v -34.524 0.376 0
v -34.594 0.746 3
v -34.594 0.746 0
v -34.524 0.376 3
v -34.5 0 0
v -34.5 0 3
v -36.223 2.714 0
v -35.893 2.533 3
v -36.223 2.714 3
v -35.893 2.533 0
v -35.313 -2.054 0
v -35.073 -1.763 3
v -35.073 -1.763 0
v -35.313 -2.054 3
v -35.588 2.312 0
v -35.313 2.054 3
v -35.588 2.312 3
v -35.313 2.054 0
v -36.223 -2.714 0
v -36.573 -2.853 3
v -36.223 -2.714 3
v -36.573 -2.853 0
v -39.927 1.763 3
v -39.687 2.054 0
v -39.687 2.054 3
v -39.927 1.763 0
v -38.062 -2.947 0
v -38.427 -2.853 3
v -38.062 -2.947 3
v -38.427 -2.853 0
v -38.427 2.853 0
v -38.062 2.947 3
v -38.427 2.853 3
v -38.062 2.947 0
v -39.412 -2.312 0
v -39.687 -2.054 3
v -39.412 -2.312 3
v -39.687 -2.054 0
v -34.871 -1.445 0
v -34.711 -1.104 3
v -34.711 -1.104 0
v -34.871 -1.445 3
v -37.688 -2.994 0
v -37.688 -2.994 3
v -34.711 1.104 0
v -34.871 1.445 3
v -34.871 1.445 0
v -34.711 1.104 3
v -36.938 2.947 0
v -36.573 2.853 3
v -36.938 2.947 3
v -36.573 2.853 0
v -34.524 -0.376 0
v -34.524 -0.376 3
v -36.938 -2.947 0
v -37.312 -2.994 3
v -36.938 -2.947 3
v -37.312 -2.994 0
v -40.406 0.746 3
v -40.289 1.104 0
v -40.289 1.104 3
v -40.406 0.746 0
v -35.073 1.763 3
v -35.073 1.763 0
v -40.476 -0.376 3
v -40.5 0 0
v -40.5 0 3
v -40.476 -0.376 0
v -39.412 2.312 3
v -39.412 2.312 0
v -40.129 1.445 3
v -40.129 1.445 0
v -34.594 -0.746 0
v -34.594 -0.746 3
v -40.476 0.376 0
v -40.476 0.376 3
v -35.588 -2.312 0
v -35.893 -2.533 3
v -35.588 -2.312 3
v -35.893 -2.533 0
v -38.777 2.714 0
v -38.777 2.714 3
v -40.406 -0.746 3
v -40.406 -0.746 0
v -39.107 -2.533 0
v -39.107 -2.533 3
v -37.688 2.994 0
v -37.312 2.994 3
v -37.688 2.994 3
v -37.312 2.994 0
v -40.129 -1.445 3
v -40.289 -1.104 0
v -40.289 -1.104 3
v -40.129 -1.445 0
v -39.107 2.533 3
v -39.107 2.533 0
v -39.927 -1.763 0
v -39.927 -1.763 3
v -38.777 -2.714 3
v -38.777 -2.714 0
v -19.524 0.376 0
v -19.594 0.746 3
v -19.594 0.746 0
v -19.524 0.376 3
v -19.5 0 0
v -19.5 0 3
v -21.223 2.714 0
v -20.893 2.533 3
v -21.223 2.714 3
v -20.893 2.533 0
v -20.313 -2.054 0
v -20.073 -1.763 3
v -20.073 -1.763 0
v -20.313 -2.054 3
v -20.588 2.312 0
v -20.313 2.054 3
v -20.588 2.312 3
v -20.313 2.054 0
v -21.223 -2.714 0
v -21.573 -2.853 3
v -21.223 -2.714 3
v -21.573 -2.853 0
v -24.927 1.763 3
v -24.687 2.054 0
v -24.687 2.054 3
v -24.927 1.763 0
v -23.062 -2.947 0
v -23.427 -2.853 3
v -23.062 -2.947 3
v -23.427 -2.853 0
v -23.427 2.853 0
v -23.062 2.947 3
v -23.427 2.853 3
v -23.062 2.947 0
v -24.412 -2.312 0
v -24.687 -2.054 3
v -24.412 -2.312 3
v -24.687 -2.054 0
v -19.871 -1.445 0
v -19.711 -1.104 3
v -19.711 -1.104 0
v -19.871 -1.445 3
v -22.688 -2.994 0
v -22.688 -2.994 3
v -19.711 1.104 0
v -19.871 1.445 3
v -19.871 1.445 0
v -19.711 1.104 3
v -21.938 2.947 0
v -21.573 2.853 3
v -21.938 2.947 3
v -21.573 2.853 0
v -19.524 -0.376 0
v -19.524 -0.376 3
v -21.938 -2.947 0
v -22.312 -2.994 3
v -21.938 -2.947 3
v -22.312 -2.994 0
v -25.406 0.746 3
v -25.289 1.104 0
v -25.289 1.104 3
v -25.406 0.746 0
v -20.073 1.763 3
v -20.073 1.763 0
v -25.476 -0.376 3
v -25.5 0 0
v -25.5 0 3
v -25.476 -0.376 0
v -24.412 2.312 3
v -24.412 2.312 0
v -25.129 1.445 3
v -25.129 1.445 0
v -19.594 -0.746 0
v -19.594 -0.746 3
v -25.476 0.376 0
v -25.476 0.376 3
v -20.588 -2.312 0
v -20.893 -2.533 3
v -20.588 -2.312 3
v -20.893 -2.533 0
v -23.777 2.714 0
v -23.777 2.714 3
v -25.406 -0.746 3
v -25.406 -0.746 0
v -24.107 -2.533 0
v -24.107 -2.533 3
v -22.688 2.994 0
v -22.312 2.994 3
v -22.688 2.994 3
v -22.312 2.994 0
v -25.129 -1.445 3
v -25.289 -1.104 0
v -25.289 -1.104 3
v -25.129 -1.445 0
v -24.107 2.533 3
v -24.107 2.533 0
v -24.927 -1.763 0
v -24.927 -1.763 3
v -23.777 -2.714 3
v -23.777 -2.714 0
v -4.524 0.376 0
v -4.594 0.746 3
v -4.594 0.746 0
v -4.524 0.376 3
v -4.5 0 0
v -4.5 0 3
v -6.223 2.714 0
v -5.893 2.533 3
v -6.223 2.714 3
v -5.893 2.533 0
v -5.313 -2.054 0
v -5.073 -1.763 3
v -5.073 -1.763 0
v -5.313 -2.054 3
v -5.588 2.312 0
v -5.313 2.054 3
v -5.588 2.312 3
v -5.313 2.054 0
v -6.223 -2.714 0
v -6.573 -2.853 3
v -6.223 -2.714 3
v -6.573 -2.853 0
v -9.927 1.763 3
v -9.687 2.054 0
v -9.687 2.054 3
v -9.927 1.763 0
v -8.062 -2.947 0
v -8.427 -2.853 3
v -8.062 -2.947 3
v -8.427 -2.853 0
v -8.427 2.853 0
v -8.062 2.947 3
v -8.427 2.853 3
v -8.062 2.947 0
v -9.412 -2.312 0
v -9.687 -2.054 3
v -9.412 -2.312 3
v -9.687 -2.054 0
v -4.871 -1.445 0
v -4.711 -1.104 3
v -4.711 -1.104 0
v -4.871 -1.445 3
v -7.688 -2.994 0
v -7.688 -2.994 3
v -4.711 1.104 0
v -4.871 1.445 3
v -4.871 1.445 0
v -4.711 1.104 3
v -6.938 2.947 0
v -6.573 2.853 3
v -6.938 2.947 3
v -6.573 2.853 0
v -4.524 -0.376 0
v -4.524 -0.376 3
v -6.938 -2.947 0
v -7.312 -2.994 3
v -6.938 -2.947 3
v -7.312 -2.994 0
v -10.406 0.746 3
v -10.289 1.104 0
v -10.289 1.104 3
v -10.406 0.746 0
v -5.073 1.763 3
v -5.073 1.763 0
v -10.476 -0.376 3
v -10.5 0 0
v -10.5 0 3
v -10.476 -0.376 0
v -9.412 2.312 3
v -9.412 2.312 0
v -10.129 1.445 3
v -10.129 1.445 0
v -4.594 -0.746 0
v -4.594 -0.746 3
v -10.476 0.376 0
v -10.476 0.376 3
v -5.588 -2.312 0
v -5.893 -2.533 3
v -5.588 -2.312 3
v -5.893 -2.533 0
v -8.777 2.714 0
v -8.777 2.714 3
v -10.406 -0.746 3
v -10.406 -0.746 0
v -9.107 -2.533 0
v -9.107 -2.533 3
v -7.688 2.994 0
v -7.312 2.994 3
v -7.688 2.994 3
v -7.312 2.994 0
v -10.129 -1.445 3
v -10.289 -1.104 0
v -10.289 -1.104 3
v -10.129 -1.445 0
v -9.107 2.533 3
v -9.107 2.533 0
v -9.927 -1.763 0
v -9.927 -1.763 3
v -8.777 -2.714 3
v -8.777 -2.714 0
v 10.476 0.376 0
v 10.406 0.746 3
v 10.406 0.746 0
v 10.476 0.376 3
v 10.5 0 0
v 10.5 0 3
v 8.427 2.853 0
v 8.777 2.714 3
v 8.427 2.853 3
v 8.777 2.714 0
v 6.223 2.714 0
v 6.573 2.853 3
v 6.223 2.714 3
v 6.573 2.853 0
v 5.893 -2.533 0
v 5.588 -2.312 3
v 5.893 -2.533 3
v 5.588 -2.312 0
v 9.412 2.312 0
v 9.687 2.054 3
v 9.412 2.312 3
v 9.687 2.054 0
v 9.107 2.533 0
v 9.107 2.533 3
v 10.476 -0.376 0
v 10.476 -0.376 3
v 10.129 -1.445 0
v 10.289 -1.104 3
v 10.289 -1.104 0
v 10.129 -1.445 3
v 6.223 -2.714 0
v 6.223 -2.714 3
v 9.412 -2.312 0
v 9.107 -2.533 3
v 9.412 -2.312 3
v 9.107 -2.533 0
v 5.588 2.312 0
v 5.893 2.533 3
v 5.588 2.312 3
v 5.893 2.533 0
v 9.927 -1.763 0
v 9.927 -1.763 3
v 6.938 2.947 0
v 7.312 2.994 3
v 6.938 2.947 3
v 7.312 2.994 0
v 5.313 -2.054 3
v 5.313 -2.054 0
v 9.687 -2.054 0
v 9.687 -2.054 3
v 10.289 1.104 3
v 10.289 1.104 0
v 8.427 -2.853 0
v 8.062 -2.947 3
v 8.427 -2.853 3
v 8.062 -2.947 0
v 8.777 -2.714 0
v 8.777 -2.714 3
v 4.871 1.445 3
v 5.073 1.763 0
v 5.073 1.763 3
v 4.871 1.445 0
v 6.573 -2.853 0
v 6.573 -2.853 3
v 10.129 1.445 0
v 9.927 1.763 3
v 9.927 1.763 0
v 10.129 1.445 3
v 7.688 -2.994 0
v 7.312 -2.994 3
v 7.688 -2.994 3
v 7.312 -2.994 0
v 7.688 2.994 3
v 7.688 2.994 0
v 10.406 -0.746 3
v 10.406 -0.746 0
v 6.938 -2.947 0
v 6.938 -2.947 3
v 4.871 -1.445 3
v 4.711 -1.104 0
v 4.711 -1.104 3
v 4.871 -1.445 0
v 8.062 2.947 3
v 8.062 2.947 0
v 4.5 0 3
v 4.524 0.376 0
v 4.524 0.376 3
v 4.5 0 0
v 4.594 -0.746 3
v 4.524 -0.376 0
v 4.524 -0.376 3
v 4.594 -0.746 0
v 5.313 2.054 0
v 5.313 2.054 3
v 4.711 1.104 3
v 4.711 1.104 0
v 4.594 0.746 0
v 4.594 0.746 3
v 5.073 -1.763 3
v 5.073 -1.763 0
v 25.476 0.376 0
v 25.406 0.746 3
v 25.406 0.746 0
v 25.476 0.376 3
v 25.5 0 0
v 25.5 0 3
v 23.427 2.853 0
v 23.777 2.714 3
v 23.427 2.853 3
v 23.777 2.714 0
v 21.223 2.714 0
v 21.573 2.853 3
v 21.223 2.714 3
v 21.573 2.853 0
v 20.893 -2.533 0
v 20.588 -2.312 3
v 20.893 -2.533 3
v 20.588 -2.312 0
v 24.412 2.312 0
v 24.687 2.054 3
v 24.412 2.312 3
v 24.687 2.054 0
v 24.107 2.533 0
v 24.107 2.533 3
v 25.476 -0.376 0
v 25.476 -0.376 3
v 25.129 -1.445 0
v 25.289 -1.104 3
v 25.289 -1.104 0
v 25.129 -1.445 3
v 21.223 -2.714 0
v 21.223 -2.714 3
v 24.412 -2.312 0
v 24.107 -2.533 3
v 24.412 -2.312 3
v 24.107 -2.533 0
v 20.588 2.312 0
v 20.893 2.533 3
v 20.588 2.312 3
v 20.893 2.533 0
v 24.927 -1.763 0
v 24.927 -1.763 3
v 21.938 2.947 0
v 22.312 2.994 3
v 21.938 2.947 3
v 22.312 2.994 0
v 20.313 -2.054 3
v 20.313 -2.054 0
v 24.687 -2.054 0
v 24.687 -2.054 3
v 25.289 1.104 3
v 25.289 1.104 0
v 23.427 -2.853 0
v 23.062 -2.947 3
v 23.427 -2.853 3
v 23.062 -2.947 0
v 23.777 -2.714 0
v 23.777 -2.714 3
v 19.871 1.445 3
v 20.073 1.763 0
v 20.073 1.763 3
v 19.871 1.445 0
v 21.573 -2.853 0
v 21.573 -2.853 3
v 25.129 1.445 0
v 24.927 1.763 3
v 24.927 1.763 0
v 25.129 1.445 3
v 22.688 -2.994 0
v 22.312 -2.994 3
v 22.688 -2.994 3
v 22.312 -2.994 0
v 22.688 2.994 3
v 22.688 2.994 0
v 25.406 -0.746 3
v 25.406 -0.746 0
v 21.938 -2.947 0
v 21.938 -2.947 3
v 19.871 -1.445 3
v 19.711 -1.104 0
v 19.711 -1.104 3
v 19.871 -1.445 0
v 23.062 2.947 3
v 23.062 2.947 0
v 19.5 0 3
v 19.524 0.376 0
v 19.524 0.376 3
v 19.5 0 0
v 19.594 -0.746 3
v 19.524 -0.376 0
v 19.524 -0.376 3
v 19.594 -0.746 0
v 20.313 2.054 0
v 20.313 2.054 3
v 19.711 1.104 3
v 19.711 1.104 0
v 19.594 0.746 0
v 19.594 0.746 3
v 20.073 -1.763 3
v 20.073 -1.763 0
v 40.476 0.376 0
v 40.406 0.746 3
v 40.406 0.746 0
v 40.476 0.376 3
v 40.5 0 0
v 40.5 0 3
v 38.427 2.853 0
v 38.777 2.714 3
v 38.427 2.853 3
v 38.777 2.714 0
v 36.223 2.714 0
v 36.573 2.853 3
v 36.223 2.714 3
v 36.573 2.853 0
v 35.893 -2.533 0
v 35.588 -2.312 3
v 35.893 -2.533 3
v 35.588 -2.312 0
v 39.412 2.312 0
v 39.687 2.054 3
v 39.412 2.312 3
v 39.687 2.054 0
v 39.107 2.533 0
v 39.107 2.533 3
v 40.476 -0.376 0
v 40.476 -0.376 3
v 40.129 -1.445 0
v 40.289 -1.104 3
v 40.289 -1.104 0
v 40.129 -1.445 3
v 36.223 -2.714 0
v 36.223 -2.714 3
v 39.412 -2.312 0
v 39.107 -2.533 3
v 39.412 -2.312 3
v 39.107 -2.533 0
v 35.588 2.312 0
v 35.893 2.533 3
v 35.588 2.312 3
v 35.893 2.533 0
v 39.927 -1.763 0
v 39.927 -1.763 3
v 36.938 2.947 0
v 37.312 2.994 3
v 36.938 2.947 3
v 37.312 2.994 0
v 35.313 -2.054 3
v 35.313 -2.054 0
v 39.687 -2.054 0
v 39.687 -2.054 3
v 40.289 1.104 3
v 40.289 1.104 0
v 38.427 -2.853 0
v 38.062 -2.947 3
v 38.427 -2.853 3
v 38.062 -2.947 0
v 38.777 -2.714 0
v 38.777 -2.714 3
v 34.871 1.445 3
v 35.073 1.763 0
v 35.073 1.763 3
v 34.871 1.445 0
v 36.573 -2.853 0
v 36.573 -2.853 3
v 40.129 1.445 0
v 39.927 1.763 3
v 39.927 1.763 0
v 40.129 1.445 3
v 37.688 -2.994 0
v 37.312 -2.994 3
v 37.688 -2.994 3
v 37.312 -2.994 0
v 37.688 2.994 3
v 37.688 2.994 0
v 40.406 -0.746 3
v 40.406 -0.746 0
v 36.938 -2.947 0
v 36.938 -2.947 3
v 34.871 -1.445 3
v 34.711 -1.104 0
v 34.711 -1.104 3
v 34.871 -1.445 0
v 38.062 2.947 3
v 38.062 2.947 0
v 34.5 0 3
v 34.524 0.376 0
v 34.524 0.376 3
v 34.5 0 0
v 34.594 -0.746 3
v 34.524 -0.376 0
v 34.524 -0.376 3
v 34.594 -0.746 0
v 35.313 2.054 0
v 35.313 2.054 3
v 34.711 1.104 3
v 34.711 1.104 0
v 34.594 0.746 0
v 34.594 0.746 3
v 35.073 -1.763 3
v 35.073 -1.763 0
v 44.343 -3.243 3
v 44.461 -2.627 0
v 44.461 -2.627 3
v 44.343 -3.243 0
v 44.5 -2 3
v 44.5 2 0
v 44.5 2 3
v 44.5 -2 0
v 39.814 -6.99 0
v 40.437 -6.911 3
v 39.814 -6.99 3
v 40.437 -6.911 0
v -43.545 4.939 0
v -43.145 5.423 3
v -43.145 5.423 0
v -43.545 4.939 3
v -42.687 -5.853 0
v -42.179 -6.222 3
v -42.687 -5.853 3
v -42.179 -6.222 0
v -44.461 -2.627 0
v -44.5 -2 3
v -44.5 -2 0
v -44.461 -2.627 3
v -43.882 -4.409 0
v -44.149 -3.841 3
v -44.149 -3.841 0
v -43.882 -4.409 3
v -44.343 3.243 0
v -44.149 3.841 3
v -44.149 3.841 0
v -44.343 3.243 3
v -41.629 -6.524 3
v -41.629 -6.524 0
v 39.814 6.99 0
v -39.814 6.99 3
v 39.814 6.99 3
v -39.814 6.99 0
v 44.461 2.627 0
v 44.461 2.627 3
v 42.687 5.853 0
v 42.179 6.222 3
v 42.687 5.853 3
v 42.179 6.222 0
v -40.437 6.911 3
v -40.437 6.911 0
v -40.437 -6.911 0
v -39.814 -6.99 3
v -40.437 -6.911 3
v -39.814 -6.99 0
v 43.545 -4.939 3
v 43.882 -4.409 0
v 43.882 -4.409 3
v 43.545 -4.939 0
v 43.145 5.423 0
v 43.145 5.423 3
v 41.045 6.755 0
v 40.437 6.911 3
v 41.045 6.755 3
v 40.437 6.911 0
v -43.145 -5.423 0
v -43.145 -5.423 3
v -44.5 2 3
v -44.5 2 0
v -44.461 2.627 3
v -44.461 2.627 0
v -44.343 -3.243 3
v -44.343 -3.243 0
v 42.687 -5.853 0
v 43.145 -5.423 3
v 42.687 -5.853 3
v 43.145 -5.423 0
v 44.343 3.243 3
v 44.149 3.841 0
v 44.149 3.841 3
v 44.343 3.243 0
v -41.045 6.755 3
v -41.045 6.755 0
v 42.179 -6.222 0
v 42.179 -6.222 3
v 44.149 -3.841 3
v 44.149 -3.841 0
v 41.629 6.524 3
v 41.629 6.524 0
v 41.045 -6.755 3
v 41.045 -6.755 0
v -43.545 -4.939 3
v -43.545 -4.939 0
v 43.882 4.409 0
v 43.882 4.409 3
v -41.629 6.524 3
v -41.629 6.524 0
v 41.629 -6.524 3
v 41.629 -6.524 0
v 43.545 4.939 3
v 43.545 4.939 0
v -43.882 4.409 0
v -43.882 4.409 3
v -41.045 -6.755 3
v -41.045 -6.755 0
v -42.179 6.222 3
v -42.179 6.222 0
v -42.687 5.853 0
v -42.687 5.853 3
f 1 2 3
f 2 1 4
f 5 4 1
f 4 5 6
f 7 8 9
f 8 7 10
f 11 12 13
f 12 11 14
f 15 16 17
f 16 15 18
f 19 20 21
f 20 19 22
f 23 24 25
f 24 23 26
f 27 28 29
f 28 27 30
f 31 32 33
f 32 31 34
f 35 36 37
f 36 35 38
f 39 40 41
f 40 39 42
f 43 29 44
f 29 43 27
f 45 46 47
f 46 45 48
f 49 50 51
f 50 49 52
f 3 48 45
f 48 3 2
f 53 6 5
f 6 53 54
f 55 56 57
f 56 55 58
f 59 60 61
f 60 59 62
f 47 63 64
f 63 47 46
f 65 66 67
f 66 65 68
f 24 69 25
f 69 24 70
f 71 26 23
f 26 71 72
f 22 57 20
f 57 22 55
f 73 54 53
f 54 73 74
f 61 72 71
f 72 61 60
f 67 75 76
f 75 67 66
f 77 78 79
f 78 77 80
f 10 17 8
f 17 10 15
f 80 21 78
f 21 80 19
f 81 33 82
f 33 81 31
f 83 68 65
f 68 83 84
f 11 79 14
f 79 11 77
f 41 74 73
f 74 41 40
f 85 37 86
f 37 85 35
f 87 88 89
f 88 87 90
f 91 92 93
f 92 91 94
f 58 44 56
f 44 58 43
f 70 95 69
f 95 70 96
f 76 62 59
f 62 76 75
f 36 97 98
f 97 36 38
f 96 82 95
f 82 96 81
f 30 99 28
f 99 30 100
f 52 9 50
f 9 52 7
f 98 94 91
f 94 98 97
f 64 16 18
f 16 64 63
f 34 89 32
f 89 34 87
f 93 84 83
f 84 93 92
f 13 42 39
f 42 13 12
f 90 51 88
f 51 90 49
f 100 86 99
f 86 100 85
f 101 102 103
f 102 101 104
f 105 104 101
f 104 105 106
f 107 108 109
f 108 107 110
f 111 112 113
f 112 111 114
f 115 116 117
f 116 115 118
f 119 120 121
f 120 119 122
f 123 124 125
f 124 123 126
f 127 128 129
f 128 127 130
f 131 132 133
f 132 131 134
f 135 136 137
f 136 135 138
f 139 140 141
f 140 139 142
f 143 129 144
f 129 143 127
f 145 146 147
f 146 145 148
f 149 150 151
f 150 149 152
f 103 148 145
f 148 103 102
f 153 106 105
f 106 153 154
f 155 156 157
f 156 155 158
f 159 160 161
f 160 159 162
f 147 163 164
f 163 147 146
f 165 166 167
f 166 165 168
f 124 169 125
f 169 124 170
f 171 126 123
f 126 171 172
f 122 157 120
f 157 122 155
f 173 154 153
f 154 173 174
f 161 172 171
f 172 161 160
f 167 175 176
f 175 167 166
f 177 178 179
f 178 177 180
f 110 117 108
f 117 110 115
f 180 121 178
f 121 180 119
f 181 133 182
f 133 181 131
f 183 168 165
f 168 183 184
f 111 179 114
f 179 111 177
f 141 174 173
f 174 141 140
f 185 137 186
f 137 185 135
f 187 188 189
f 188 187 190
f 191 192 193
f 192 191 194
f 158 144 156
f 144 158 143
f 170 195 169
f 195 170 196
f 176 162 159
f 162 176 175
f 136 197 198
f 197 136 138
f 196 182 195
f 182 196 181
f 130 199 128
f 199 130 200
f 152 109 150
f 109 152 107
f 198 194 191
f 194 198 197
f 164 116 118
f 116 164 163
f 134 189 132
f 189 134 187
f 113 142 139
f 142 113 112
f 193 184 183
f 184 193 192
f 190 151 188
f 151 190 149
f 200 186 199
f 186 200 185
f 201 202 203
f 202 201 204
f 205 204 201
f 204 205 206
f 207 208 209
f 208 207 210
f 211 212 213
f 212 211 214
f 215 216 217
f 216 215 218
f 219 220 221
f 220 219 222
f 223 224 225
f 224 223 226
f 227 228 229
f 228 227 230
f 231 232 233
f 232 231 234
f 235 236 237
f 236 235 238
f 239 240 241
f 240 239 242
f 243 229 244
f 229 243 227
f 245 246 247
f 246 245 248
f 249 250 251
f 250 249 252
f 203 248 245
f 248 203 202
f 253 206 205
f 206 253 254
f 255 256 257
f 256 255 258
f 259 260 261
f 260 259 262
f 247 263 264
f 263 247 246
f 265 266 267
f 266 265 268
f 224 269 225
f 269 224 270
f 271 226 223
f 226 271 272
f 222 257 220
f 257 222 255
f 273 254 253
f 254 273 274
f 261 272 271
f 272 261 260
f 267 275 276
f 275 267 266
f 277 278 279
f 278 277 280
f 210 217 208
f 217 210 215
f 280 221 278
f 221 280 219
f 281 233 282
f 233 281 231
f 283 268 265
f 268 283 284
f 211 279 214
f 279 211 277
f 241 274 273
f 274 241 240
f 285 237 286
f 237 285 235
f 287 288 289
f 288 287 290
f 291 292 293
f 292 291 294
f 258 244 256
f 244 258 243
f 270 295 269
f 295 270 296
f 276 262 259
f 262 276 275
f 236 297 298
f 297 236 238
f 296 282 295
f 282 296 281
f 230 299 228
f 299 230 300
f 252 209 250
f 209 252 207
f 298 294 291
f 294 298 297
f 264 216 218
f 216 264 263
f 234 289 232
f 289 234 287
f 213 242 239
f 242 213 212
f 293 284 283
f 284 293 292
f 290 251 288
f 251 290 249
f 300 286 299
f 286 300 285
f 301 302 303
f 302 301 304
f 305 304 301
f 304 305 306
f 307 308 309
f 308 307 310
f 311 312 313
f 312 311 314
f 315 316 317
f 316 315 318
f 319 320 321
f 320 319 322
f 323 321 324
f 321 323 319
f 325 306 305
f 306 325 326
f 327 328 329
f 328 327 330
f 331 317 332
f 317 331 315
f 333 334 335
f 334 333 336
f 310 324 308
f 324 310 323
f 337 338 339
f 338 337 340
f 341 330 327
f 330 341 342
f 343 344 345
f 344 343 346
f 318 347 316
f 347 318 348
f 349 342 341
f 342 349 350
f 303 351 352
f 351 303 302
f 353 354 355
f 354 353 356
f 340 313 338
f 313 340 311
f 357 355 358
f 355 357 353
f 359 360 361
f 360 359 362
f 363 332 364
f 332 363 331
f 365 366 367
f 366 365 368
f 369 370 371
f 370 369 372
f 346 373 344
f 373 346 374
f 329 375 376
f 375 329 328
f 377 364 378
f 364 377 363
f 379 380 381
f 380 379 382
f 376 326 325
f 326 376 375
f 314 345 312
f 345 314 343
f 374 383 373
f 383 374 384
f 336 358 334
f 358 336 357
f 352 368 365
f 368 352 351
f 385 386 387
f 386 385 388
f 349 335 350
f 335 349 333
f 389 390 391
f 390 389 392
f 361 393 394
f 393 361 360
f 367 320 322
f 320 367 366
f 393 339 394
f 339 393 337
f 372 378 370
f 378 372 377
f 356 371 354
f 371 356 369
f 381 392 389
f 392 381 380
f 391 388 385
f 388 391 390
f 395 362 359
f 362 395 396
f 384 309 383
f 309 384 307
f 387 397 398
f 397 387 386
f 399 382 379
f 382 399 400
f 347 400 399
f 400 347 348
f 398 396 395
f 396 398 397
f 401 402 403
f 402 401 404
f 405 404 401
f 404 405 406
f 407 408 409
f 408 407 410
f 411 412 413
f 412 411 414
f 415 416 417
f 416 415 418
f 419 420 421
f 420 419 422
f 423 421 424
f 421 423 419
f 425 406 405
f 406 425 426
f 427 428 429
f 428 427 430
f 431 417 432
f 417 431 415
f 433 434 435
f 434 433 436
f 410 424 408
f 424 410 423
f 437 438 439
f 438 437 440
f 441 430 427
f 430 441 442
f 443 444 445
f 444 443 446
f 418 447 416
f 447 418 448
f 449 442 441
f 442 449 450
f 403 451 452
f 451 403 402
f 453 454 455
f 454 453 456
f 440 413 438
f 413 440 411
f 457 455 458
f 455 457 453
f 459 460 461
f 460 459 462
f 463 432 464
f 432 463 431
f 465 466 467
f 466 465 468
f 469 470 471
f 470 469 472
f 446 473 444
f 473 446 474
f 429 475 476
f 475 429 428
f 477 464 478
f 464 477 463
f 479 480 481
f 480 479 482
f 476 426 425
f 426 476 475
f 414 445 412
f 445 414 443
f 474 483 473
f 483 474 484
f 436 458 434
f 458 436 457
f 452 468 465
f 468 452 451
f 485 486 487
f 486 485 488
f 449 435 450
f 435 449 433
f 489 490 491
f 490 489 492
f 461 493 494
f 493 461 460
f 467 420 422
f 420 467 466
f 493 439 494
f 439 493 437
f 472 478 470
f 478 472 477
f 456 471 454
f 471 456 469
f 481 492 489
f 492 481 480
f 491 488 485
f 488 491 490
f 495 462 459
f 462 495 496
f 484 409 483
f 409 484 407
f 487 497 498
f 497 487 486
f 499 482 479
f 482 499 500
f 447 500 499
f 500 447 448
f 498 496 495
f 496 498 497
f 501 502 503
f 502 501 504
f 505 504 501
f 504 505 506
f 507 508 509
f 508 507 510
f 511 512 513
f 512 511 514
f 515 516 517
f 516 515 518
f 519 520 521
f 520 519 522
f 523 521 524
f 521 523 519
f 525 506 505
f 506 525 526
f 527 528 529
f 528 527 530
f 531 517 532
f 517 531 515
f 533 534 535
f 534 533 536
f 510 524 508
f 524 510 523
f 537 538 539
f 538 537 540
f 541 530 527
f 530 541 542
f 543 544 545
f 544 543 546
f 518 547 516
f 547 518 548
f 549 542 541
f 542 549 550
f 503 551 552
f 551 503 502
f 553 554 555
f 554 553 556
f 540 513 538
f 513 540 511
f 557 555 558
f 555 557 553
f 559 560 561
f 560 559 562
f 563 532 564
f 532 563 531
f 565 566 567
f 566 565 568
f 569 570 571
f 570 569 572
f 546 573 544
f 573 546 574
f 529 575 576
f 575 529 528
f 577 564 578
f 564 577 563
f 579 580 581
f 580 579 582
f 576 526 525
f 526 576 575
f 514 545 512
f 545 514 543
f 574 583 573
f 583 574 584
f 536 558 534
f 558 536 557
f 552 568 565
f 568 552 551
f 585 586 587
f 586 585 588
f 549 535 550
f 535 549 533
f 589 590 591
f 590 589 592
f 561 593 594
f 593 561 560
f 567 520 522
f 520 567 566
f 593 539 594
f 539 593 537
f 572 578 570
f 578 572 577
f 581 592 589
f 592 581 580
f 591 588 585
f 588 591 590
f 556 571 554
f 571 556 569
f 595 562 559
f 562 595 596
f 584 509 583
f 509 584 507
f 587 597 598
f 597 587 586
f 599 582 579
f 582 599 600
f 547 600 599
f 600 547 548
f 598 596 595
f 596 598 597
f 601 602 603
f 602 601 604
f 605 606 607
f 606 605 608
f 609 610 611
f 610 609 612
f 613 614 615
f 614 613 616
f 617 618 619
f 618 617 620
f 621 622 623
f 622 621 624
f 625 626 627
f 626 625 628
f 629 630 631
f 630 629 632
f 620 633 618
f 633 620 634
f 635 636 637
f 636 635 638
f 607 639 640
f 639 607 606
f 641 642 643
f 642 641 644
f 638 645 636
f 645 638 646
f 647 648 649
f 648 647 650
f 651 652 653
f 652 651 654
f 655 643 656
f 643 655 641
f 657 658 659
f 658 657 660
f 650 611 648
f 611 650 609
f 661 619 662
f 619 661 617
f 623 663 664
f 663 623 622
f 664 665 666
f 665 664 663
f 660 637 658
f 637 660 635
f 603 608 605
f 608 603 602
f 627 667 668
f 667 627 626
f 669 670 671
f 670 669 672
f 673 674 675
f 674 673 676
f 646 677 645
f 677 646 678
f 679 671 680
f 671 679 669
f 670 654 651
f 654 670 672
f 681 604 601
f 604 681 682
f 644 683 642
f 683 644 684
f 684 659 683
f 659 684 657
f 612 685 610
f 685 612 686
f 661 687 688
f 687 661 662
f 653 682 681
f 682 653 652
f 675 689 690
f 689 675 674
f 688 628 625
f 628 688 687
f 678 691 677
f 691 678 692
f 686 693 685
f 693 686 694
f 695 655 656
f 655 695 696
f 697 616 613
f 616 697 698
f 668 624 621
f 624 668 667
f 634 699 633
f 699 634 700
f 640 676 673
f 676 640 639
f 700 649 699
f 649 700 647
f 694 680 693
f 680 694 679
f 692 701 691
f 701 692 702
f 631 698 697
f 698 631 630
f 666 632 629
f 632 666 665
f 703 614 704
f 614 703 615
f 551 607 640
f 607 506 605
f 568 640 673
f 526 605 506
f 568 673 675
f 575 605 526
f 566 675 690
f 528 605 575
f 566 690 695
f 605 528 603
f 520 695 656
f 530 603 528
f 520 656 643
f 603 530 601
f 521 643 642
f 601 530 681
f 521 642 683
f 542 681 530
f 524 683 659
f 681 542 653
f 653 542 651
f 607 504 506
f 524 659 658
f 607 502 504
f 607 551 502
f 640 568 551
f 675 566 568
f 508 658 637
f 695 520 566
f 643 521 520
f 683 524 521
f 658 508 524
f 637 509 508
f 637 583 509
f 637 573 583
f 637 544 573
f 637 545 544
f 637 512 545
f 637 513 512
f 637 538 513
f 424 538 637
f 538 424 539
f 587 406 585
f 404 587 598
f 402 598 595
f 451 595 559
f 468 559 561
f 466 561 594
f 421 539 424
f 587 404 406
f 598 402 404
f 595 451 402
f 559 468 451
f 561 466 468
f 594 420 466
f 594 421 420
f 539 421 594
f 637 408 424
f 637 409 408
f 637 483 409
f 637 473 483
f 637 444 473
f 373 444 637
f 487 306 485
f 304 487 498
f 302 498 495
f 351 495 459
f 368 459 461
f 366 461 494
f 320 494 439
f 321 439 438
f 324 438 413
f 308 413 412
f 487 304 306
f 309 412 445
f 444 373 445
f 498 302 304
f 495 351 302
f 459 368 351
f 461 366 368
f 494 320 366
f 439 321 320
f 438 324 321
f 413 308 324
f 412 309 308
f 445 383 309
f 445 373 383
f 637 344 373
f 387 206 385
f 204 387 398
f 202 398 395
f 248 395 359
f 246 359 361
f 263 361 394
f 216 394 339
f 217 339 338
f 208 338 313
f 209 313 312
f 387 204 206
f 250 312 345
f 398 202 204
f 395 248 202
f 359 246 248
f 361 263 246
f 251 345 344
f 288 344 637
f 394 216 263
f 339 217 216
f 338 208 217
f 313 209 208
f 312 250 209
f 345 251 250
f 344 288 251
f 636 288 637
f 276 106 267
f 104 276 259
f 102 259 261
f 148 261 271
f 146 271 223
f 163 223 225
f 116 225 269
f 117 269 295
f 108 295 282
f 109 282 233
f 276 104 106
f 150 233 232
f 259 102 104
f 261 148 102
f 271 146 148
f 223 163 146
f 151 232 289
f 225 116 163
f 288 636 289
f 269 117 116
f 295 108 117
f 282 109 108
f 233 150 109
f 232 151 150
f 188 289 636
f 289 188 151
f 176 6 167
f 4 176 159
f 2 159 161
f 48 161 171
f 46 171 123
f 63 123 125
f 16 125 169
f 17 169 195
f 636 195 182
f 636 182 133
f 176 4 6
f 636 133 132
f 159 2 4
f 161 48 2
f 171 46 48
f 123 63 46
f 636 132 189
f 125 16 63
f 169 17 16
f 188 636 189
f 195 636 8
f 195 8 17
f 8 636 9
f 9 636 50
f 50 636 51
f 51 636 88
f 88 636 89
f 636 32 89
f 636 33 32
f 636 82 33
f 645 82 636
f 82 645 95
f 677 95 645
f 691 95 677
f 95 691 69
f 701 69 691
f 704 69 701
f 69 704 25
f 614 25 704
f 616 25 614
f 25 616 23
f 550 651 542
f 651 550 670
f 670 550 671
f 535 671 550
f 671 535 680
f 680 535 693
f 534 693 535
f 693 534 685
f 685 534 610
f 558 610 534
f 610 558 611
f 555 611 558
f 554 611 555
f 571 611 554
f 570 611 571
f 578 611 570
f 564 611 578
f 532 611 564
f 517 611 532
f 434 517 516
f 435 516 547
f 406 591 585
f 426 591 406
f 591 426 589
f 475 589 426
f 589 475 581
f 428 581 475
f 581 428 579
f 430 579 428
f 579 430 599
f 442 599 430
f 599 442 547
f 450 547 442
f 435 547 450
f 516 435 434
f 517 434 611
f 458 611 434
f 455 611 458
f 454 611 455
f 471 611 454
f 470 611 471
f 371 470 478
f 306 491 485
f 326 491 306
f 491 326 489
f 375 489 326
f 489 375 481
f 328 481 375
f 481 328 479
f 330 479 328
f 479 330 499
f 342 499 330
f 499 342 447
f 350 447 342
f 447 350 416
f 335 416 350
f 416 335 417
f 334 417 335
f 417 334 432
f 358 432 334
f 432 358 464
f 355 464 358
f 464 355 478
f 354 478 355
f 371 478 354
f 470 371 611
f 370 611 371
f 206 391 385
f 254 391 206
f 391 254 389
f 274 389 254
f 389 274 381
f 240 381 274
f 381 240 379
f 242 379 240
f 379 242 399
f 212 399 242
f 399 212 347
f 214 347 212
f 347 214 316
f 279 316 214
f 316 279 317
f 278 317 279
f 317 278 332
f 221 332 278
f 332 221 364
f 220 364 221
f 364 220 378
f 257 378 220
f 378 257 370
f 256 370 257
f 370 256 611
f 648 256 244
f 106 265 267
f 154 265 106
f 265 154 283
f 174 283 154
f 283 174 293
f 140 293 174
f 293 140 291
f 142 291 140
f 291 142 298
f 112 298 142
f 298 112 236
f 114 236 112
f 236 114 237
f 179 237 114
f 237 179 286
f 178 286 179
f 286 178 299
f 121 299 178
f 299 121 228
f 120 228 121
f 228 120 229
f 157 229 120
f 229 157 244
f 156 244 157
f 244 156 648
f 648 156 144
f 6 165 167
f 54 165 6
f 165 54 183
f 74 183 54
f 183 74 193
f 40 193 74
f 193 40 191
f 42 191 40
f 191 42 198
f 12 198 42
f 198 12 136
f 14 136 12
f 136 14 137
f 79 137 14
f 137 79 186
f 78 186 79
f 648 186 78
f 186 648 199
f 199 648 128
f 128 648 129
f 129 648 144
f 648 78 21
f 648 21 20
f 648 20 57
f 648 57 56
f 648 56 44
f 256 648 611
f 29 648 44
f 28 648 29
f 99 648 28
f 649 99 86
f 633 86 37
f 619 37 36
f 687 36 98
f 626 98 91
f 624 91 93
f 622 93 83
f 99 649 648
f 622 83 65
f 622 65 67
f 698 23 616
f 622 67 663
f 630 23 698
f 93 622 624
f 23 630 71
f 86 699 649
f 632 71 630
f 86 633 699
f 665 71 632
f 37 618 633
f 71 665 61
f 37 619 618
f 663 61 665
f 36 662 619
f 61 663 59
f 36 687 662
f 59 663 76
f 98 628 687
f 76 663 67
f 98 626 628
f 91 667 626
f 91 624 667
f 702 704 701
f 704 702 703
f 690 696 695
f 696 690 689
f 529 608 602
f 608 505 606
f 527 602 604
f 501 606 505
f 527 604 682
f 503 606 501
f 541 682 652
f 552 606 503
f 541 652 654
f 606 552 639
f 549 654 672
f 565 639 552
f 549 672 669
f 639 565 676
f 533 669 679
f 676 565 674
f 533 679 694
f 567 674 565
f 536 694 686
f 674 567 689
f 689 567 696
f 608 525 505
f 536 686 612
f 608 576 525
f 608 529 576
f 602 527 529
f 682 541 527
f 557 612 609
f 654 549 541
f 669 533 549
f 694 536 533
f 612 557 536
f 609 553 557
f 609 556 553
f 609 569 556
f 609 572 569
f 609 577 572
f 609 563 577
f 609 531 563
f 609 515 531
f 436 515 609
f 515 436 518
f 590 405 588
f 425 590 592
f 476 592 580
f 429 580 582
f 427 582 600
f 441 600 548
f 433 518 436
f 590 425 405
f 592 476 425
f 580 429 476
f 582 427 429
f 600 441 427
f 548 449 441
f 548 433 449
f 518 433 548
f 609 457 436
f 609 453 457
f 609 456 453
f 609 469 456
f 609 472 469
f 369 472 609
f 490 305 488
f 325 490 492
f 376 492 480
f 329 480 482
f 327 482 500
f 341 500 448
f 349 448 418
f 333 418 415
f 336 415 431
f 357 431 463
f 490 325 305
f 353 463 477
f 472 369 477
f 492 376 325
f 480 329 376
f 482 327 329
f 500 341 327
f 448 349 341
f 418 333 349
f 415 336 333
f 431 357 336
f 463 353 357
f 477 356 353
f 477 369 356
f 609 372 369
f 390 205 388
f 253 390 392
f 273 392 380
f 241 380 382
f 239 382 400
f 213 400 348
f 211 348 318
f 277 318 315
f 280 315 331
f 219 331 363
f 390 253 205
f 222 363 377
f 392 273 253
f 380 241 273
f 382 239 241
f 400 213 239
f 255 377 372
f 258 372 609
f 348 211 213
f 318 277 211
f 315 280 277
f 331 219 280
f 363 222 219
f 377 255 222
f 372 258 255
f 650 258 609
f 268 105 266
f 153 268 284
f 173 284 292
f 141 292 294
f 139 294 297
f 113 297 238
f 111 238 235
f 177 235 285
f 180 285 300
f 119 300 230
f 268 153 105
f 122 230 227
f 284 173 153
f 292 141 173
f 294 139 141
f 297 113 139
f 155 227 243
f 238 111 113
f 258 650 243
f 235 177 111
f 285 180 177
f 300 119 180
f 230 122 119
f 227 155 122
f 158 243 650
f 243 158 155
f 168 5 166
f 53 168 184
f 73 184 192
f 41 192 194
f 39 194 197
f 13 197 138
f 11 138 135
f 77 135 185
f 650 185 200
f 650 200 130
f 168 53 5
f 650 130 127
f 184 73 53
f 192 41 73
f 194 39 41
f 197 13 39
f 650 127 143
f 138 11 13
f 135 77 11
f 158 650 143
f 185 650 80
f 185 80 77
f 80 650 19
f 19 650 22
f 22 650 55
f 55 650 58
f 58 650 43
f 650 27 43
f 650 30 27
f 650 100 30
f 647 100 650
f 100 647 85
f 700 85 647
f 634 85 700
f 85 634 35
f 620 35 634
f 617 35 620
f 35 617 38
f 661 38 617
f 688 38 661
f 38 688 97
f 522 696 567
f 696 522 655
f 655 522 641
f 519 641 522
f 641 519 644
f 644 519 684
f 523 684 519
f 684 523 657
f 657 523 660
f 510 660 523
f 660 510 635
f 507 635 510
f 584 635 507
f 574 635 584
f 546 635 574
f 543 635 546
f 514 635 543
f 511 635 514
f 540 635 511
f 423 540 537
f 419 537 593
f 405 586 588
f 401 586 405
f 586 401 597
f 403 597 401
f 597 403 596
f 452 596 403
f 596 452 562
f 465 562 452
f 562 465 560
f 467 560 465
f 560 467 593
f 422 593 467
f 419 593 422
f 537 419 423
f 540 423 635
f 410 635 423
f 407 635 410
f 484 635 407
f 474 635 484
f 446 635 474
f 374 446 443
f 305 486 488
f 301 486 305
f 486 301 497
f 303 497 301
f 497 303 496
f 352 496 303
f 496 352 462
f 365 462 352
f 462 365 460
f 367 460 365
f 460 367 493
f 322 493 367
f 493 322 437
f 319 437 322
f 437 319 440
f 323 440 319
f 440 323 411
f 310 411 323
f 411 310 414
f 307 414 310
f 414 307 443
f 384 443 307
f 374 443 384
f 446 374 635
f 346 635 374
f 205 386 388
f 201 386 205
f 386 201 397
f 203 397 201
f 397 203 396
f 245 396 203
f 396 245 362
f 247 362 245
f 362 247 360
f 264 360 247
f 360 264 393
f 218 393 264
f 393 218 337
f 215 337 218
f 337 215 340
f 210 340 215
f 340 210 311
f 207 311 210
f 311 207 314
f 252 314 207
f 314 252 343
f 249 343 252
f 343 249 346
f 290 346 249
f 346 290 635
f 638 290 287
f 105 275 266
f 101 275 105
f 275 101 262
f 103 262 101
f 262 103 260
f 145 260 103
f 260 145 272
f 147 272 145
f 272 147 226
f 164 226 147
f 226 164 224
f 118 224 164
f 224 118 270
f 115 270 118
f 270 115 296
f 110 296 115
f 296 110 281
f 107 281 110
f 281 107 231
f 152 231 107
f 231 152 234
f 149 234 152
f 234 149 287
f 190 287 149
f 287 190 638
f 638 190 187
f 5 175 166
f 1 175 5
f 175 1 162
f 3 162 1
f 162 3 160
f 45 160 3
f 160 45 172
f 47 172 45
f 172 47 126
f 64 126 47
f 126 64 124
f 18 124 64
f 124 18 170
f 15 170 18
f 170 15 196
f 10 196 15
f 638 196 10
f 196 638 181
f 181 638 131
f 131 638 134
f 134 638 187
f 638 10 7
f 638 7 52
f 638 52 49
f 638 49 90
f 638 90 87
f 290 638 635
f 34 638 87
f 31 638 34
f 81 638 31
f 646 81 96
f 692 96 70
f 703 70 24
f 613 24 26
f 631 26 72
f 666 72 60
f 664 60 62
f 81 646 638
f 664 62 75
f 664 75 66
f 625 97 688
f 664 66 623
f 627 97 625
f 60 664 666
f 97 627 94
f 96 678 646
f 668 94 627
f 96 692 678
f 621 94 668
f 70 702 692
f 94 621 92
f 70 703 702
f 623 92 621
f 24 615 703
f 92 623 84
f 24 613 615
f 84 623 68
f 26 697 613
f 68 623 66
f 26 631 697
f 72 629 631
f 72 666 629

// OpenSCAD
// Generated by SolidPython 1.1.3 on 2023-03-12 22:17:03
$fn = 50;


difference() {
	union() {
		translate(v = [0, 0, 0]) {
			rotate(a = [0, 0, 0]) {
				hull() {
					translate(v = [-39.5000000000, 2.0000000000, 0]) {
						rotate(a = [0, 0, 0]) {
							translate(v = [0, 0, 0]) {
								rotate(a = [0, 0, 0]) {
									cylinder(h = 3, r = 5);
								}
							}
						}
					}
					translate(v = [39.5000000000, 2.0000000000, 0]) {
						rotate(a = [0, 0, 0]) {
							translate(v = [0, 0, 0]) {
								rotate(a = [0, 0, 0]) {
									cylinder(h = 3, r = 5);
								}
							}
						}
					}
					translate(v = [-39.5000000000, -2.0000000000, 0]) {
						rotate(a = [0, 0, 0]) {
							translate(v = [0, 0, 0]) {
								rotate(a = [0, 0, 0]) {
									cylinder(h = 3, r = 5);
								}
							}
						}
					}
					translate(v = [39.5000000000, -2.0000000000, 0]) {
						rotate(a = [0, 0, 0]) {
							translate(v = [0, 0, 0]) {
								rotate(a = [0, 0, 0]) {
									cylinder(h = 3, r = 5);
								}
							}
						}
					}
				}
			}
		}
	}
	union() {
		translate(v = [-37.5000000000, 0.0000000000, 0]) {
			rotate(a = [0, 0, 0]) {
				translate(v = [0, 0, -50]) {
					rotate(a = [0, 0, 0]) {
						cylinder(h = 100, r = 3.0000000000);
					}
				}
			}
		}
		translate(v = [-22.5000000000, 0.0000000000, 0]) {
			rotate(a = [0, 0, 0]) {
				translate(v = [0, 0, -50]) {
					rotate(a = [0, 0, 0]) {
						cylinder(h = 100, r = 3.0000000000);
					}
				}
			}
		}
		translate(v = [-7.5000000000, 0.0000000000, 0]) {
			rotate(a = [0, 0, 0]) {
				translate(v = [0, 0, -50]) {
					rotate(a = [0, 0, 0]) {
						cylinder(h = 100, r = 3.0000000000);
					}
				}
			}
		}
		translate(v = [7.5000000000, 0.0000000000, 0]) {
			rotate(a = [0, 0, 0]) {
				translate(v = [0, 0, -50]) {
					rotate(a = [0, 0, 0]) {
						cylinder(h = 100, r = 3.0000000000);
					}
				}
			}
		}
		translate(v = [22.5000000000, 0.0000000000, 0]) {
			rotate(a = [0, 0, 0]) {
				translate(v = [0, 0, -50]) {
					rotate(a = [0, 0, 0]) {
						cylinder(h = 100, r = 3.0000000000);
					}
				}
			}
		}
		translate(v = [37.5000000000, 0.0000000000, 0]) {
			rotate(a = [0, 0, 0]) {
				translate(v = [0, 0, -50]) {
					rotate(a = [0, 0, 0]) {
						cylinder(h = 100, r = 3.0000000000);
					}
				}
			}
		}
	}
}
/***********************************************
*********      SolidPython code:      **********
************************************************
 
from solid import *
import os
import subprocess

import oomB

import opsc_library_gen

mode = "laser"
#mode = "3d_print"

defined_objects = {}

radius_dict = {}
countersunk_dict = {}


def set_mode(m):
    global mode
    mode = m
    radius_dict['M6'] = 6.5/2
    radius_dict['M3'] = 3.3/2
    if mode == "laser":
        radius_dict['M6'] = 6/2
        radius_dict['M3'] = 3/2

    countersunk_dict['M3'] = {}
    countersunk_dict['M3']['little_rad'] = radius_dict['M3']
    countersunk_dict['M3']['big_rad'] = (5.5+0.6)/2
    if mode == "laser":
        countersunk_dict['M3']['big_rad'] = (4.75+0.6)/2
        countersunk_dict['M3']['little_rad'] = (4.75+0.6)/2

    countersunk_dict['M3']['height'] = 1.7


def opsc_make_object(filename, objects, save_type="none",resolution=50, layers = 1, tilediff = 200, mode="laser", overwrite=True):
    if overwrite or not os.path.exists(filename):
        set_mode(mode)
        save_type = save_type.lower()
        os.makedirs(os.path.dirname(filename), exist_ok=True)
        final_object = opsc_get_object(objects, mode = mode)
        # Save the final object to the specified filename    
        scad_render_to_file(final_object, filename, file_header='$fn = %s;' % resolution, include_orig_code=True)
        if mode == "laser":
            filename_laser = filename.replace(".scad","-flat.scad")
            scad_render_to_file(getLaser(final_object, layers=layers, tilediff=tilediff), filename_laser, file_header='$fn = %s;' % resolution, include_orig_code=True)
            if save_type == "all":
                saveToAll(filename_laser)
            elif save_type == "dxf":
                saveToDxf(filename_laser)
        if save_type == "all":
            saveToAll(filename)
        elif save_type == "dxf":
            saveToDxf(filename)


def opsc_get_object(objects, mode = "laser"):
    # Create the solidpython objects only include the positive objects and if they don't have inclusion or their inclusion is either all or mode
    # Initialize an empty list to store the results
    positive_objects = []

    # Iterate over the "objects" list
    for obj in objects:
        # Check if the current object has a "type" key with a value of "positive"
        if obj['type'] == 'positive':
            # Check if the current object has an "inclusion" key and its value matches "mode",
            # or if the current object does not have an "inclusion" key at all
            if not 'inclusion' in obj or obj['inclusion'] == "all" or obj['inclusion'] == mode:
                # Call the "get_opsc_item" function with the current object as an argument
                opsc_item = get_opsc_item(obj)
                # Add the result to the "positive_objects" list
                positive_objects.append(opsc_item)
# Initialize an empty list to store the results
    negative_objects = []

    # Iterate over the "objects" list
    for obj in objects:
        # Check if the current object has a "type" key with a value of "negative"
        if obj['type'] == 'negative':
            # Check if the current object has an "inclusion" key and its value matches "mode",
            # or if the current object does not have an "inclusion" key at all
            if not 'inclusion' in obj or obj['inclusion'] == "all" or obj['inclusion'] == mode:
                # Call the "get_opsc_item" function with the current object as an argument
                opsc_item = get_opsc_item(obj)
                # Add the result to the "negative_objects" list
                negative_objects.append(opsc_item)
    
    #positive_objects = [get_opsc_item(obj) for obj in objects if obj['type'] == 'positive']
    #negative_objects = [get_opsc_item(obj) for obj in objects if obj['type'] == 'negative']
    # Union the positive objects
    positive_object = union()(*positive_objects)
    # Union the negative objects
    negative_object = union()(*negative_objects)
    # Create the final object by subtracting the negative objects from the positive objects
    return difference()(positive_object, negative_object)

def get_opsc_item(params):
    # A dictionary to map radius string values to numerical values
    #radius_dict = {'small': 5, 'medium': 10, 'large': 15}
    # An array of function names for basic shapes
    basic_shapes = ['cube', 'sphere', 'cylinder']
    
    # An array of function names for other shapes
    other_shapes = ['hole', 'slot', 'rounded_rectangle', 'countersunk']
    


    # Convert radius to r if present, and remove radius from the params dictionary
    if 'radius' in params:
        if isinstance(params['radius'], str):
            # Use the radius_dict to map the radius string value to a numerical value
            params['r'] = radius_dict[params['radius']]
        else:
            params['r'] = params['radius']
        del params['radius']
    

    # Check if the object type is a basic shape
    if params['shape'] in basic_shapes:
        # Remove shape and unexpected dictionary values
        allowed_keys = {'size', 'r', 'r1', 'r2', 'd', 'h', 'rw', 'rh', 'dw', 'dh'}
        shape_params = {k: v for k, v in params.items() if k in allowed_keys}

        # Call the corresponding function for the shape parameter, using ** notation to pass the shape_params dictionary as keyword arguments
        return get_opsc_transform(params,globals()[params['shape']](**shape_params))
    
    # If the object type is not a basic shape, check if it's a defined object or one of the other shapes
    elif params['shape'] in other_shapes:
        # Call the corresponding function for the shape parameter, passing the params dictionary as an argument
        p2 = copy.deepcopy(params)
        p2["pos"] = [0,0,0]
        return get_opsc_transform(params,globals()[params['shape']](p2))
    
    # If the object is not a basic shape or a defined object, try to import it from a .scad file
    else:
        obj = defined_objects[params['shape']]
        return get_opsc_transform(params,obj)

def get_opsc_transform(params, solid_obj):
    # Rotate the object based on the 'rot' field in the params dictionary, or the 'rotX', 'rotY', and 'rotZ' fields if 'rot' is not present
    rot = params.get('rot', [])
    if rot:
        rotX, rotY, rotZ = rot
    else:
        rotX = params.get('rotX', 0)
        rotY = params.get('rotY', 0)
        rotZ = params.get('rotZ', 0)
    solid_obj = rotate([rotX, rotY, rotZ])(solid_obj)

    # Translate the object based on the 'pos' field in the params dictionary, or the 'x', 'y', and 'z' fields if 'pos' is not present
    pos = params.get('pos', [])
    if pos:
        x, y, z = pos
    else:
        x = params.get('x', 0)
        y = params.get('y', 0)
        z = params.get('z', 0)
    solid_obj = translate([x, y, z])(solid_obj)
    return solid_obj


import random

def opsc_easy_array(type, shape, repeats, pos_start, shift_arr, **kwargs):
    for i in range(0,3):
        repeats.append(1)
        pos_start.append(0)
        shift_arr.append(0)
    return_objects = []

    for x in range(0,repeats[0]):
        for y in range(0,repeats[1]):
            for z in range(0,repeats[2]):
                return_objects.append(opsc_easy(type, shape, pos=[pos_start[0]+x*shift_arr[0],pos_start[1]+y*shift_arr[1],pos_start[2]+z*shift_arr[2]], **kwargs))
    return return_objects                



def opsc_easy(type, shape, **kwargs):
    obj = {
        'type': type,
        'shape': shape
    }
    for param in ['size', 'r', 'r1', 'r2', 'd', 'h', 'rw', 'rh', 'dw', 'dh', 'pos', 'x', 'y', 'z', 'rot', 'rotX', 'rotY', 'rotZ', "w", "inclusion"]:
        if param in kwargs:
            obj[param] = kwargs[param]
    return obj

def hole(params):
    p2 = copy.deepcopy(params)  
    # Check if the radius is a string and replace it with the corresponding value from the dictionary
    if isinstance(p2['r'], str):
        p2['r'] = radius_dict[p2['r']]
    
    # Set the height to 100 if not specified
    if 'h' not in p2:
        p2['h'] = 100
        p2["pos"] = [0,0,-50]
    p2["center"] = True
    # Create the cylinder object
    p2["shape"] = "cylinder"
    p2["type"] = "positive"

    return get_opsc_item(p2)

import copy

def countersunk(params):
    p2 = copy.deepcopy(params)
    counter_rad = p2['r']
    p2['r'] = radius_dict[p2['r']]
    hp = copy.deepcopy(p2)
    hp["type"] = "positive"
    hp["shape"] = "hole"
    del hp["rot"]
    hol = get_opsc_item(hp)
    
    cp = copy.deepcopy(p2)
    cp["h"] = countersunk_dict[counter_rad]["height"]
    cp["r2"] = countersunk_dict[counter_rad]["little_rad"]
    cp["r1"] = countersunk_dict[counter_rad]["big_rad"]
    del cp["r"]
    del cp["rot"]
    cp["type"] = "positive"
    cp["shape"] = "cylinder"
    cp["pos"] = [0,0,0]

    top = get_opsc_item(cp)
    return union()(hol,top)



def slot(params):  
    p2 = copy.deepcopy(params) 
    if isinstance(p2['r'], str):
        p2['r'] = radius_dict[p2['r']]
    p2["type"] = "positive"
    p2["shape"] = "hole"
    del p2["rot"]
    p2["pos"] = [0,0,0]
    left = copy.deepcopy(p2)
    right = copy.deepcopy(p2)
    left["pos"][0] = p2["w"] / 2 - p2["r"] 
    
    right["pos"][0] = -p2["w"] / 2 + p2["r"] 
    pass
    leftObj = get_opsc_item(left)
    rightObj = get_opsc_item(right)
    return hull()(leftObj, rightObj)

def rounded_rectangle(params):   
    p2 = copy.deepcopy(params) 
    p2["h"] = p2["size"][2]
    p2["pos"] = p2.get("pos", [0, 0, 0]) 
    p2["type"] = "positive"
    p2["shape"] = "hole"
    p2["pos"] = [0,0,0]
    
    if 'rot' in p2:
        del p2["rot"]   
    if 'r' not in p2:
        p2["r"] = 5 
    tl = copy.deepcopy(p2)
    tr = copy.deepcopy(p2)
    bl = copy.deepcopy(p2)
    br = copy.deepcopy(p2)
    tl["pos"][0] = -(p2["size"][0] - p2["r"]*2)/2
    tl["pos"][1] = (p2["size"][1] - p2["r"]*2)/2
    tr["pos"][0] = (p2["size"][0] - p2["r"]*2)/2
    tr["pos"][1] = (p2["size"][1] - p2["r"]*2)/2
    bl["pos"][0] = -(p2["size"][0] - p2["r"]*2)/2
    bl["pos"][1] = -(p2["size"][1] - p2["r"]*2)/2
    br["pos"][0] = (p2["size"][0] - p2["r"]*2)/2
    br["pos"][1] = -(p2["size"][1] - p2["r"]*2)/2
    del tl["size"]
    del tr["size"]
    del bl["size"]
    del br["size"]
    tlo = get_opsc_item(tl)
    tro = get_opsc_item(tr)
    blo = get_opsc_item(bl)
    bro = get_opsc_item(br)    
    return hull()(tlo, tro, blo, bro)



def import_scad_object(filename):
    # Import the .scad file and convert it to a solidpython object
    #filename = "parts"
    obj = import_scad(filename)
    return obj.main()
    


import os
import solid as solidpython

# A dictionary to store the defined objects


def load_scad_objects():
    opsc_library_gen.gen_library(defined_objects)

import random

def test(num_objects):
    objects = []
    for i in range(num_objects):
        # Choose a random shape
        #shape = random.choice(['cube', 'sphere', 'cylinder', 'hole', 'slot', "rounded_rectangle"])
        shape = random.choice(["rounded_rectangle"])

        # Choose a random type
        type = random.choice(['positive', 'negative'])
        
        # Create an empty object dictionary
        obj = {'shape': shape, 'type': type}
        
        # Set shape-specific parameters
        if obj['shape'] in ['cube']:
            obj['size'] =  [random.uniform(5, 15), random.uniform(5, 15), random.uniform(5, 15)]
        if obj['shape'] in ['rounded_rectangle']:
            obj['size'] =  [random.uniform(5, 15), random.uniform(5, 15), random.uniform(5, 15)]
            obj['r'] = random.uniform(0.5, 5)
        elif obj['shape'] == 'sphere':
            obj['r'] = random.uniform(5, 15)
        elif obj['shape'] in ['cylinder', 'hole']:
            obj['r'] = random.uniform(0.5, 5)
            obj['h'] = random.uniform(5, 15)
        elif obj['shape'] == 'slot':
            obj['r'] = random.uniform(0.5, 5)
            obj['h'] = random.uniform(5, 15)
            obj['w'] = random.uniform(5, 15)
        
        # Set a random position and rotation
        obj['pos'] = [random.uniform(-20, 20), random.uniform(-20, 20), random.uniform(-20, 20)]
        obj['rot'] = [random.uniform(-180, 180), random.uniform(-180, 180), random.uniform(-180, 180)]
        
        # Add the object to the list
        objects.append(obj)
    return objects

####### old file saving
def saveToAll(fileIn):
    saveToDxf(fileIn)
    saveToPng(fileIn)
    saveToStl(fileIn)
    saveToSvg(fileIn)

def saveToDxf(fileIn, fileOut="", copy_to_laser=True):
    if fileOut == "":
        fileOut = fileIn.replace(".scad",".dxf")
    saveToFile(fileIn, fileOut)


    
def saveToPng(fileIn, fileOut="",extra="--render"):
    if fileOut == "":
        fileOut = fileIn.replace(".scad",".png")
    saveToFile(fileIn, fileOut)

def saveToStl(fileIn, fileOut=""):
    if fileOut == "":
        fileOut = fileIn.replace(".scad",".stl")
    saveToFile(fileIn, fileOut)
    
def saveToSvg(fileIn, fileOut=""):
    if fileOut == "":
        fileOut = fileIn.replace(".scad",".svg")
    saveToFile(fileIn, fileOut)

def saveToFile(fileIn, fileOut,extra=""):
    #extra = extra + " --colorscheme Tomorrow"

    launchStr = 'openscad -o "' + fileOut + '"' + extra + ' "' + fileIn + '"'
    if ".png" in fileOut:
        launchStr = launchStr + " --render"
    print("            saveToFile launch string: " + launchStr)
    subprocess.run(launchStr)
    x=0

def getLaser(final_object,start=1.5,layers=1,thickness=3,tilediff=200):
        rv= []

        for x in range(layers):
            rv.append(translate([0,x*tilediff,0])(
                    projection()(
                        intersection()(translate([-500,-500,start+x*thickness])(cube(size=[1000,1000,0.1])),
                            final_object
                        )
                    )
            )
            )
            
        return union()(rv)

set_mode("laser")
load_scad_objects() 
 
************************************************/
